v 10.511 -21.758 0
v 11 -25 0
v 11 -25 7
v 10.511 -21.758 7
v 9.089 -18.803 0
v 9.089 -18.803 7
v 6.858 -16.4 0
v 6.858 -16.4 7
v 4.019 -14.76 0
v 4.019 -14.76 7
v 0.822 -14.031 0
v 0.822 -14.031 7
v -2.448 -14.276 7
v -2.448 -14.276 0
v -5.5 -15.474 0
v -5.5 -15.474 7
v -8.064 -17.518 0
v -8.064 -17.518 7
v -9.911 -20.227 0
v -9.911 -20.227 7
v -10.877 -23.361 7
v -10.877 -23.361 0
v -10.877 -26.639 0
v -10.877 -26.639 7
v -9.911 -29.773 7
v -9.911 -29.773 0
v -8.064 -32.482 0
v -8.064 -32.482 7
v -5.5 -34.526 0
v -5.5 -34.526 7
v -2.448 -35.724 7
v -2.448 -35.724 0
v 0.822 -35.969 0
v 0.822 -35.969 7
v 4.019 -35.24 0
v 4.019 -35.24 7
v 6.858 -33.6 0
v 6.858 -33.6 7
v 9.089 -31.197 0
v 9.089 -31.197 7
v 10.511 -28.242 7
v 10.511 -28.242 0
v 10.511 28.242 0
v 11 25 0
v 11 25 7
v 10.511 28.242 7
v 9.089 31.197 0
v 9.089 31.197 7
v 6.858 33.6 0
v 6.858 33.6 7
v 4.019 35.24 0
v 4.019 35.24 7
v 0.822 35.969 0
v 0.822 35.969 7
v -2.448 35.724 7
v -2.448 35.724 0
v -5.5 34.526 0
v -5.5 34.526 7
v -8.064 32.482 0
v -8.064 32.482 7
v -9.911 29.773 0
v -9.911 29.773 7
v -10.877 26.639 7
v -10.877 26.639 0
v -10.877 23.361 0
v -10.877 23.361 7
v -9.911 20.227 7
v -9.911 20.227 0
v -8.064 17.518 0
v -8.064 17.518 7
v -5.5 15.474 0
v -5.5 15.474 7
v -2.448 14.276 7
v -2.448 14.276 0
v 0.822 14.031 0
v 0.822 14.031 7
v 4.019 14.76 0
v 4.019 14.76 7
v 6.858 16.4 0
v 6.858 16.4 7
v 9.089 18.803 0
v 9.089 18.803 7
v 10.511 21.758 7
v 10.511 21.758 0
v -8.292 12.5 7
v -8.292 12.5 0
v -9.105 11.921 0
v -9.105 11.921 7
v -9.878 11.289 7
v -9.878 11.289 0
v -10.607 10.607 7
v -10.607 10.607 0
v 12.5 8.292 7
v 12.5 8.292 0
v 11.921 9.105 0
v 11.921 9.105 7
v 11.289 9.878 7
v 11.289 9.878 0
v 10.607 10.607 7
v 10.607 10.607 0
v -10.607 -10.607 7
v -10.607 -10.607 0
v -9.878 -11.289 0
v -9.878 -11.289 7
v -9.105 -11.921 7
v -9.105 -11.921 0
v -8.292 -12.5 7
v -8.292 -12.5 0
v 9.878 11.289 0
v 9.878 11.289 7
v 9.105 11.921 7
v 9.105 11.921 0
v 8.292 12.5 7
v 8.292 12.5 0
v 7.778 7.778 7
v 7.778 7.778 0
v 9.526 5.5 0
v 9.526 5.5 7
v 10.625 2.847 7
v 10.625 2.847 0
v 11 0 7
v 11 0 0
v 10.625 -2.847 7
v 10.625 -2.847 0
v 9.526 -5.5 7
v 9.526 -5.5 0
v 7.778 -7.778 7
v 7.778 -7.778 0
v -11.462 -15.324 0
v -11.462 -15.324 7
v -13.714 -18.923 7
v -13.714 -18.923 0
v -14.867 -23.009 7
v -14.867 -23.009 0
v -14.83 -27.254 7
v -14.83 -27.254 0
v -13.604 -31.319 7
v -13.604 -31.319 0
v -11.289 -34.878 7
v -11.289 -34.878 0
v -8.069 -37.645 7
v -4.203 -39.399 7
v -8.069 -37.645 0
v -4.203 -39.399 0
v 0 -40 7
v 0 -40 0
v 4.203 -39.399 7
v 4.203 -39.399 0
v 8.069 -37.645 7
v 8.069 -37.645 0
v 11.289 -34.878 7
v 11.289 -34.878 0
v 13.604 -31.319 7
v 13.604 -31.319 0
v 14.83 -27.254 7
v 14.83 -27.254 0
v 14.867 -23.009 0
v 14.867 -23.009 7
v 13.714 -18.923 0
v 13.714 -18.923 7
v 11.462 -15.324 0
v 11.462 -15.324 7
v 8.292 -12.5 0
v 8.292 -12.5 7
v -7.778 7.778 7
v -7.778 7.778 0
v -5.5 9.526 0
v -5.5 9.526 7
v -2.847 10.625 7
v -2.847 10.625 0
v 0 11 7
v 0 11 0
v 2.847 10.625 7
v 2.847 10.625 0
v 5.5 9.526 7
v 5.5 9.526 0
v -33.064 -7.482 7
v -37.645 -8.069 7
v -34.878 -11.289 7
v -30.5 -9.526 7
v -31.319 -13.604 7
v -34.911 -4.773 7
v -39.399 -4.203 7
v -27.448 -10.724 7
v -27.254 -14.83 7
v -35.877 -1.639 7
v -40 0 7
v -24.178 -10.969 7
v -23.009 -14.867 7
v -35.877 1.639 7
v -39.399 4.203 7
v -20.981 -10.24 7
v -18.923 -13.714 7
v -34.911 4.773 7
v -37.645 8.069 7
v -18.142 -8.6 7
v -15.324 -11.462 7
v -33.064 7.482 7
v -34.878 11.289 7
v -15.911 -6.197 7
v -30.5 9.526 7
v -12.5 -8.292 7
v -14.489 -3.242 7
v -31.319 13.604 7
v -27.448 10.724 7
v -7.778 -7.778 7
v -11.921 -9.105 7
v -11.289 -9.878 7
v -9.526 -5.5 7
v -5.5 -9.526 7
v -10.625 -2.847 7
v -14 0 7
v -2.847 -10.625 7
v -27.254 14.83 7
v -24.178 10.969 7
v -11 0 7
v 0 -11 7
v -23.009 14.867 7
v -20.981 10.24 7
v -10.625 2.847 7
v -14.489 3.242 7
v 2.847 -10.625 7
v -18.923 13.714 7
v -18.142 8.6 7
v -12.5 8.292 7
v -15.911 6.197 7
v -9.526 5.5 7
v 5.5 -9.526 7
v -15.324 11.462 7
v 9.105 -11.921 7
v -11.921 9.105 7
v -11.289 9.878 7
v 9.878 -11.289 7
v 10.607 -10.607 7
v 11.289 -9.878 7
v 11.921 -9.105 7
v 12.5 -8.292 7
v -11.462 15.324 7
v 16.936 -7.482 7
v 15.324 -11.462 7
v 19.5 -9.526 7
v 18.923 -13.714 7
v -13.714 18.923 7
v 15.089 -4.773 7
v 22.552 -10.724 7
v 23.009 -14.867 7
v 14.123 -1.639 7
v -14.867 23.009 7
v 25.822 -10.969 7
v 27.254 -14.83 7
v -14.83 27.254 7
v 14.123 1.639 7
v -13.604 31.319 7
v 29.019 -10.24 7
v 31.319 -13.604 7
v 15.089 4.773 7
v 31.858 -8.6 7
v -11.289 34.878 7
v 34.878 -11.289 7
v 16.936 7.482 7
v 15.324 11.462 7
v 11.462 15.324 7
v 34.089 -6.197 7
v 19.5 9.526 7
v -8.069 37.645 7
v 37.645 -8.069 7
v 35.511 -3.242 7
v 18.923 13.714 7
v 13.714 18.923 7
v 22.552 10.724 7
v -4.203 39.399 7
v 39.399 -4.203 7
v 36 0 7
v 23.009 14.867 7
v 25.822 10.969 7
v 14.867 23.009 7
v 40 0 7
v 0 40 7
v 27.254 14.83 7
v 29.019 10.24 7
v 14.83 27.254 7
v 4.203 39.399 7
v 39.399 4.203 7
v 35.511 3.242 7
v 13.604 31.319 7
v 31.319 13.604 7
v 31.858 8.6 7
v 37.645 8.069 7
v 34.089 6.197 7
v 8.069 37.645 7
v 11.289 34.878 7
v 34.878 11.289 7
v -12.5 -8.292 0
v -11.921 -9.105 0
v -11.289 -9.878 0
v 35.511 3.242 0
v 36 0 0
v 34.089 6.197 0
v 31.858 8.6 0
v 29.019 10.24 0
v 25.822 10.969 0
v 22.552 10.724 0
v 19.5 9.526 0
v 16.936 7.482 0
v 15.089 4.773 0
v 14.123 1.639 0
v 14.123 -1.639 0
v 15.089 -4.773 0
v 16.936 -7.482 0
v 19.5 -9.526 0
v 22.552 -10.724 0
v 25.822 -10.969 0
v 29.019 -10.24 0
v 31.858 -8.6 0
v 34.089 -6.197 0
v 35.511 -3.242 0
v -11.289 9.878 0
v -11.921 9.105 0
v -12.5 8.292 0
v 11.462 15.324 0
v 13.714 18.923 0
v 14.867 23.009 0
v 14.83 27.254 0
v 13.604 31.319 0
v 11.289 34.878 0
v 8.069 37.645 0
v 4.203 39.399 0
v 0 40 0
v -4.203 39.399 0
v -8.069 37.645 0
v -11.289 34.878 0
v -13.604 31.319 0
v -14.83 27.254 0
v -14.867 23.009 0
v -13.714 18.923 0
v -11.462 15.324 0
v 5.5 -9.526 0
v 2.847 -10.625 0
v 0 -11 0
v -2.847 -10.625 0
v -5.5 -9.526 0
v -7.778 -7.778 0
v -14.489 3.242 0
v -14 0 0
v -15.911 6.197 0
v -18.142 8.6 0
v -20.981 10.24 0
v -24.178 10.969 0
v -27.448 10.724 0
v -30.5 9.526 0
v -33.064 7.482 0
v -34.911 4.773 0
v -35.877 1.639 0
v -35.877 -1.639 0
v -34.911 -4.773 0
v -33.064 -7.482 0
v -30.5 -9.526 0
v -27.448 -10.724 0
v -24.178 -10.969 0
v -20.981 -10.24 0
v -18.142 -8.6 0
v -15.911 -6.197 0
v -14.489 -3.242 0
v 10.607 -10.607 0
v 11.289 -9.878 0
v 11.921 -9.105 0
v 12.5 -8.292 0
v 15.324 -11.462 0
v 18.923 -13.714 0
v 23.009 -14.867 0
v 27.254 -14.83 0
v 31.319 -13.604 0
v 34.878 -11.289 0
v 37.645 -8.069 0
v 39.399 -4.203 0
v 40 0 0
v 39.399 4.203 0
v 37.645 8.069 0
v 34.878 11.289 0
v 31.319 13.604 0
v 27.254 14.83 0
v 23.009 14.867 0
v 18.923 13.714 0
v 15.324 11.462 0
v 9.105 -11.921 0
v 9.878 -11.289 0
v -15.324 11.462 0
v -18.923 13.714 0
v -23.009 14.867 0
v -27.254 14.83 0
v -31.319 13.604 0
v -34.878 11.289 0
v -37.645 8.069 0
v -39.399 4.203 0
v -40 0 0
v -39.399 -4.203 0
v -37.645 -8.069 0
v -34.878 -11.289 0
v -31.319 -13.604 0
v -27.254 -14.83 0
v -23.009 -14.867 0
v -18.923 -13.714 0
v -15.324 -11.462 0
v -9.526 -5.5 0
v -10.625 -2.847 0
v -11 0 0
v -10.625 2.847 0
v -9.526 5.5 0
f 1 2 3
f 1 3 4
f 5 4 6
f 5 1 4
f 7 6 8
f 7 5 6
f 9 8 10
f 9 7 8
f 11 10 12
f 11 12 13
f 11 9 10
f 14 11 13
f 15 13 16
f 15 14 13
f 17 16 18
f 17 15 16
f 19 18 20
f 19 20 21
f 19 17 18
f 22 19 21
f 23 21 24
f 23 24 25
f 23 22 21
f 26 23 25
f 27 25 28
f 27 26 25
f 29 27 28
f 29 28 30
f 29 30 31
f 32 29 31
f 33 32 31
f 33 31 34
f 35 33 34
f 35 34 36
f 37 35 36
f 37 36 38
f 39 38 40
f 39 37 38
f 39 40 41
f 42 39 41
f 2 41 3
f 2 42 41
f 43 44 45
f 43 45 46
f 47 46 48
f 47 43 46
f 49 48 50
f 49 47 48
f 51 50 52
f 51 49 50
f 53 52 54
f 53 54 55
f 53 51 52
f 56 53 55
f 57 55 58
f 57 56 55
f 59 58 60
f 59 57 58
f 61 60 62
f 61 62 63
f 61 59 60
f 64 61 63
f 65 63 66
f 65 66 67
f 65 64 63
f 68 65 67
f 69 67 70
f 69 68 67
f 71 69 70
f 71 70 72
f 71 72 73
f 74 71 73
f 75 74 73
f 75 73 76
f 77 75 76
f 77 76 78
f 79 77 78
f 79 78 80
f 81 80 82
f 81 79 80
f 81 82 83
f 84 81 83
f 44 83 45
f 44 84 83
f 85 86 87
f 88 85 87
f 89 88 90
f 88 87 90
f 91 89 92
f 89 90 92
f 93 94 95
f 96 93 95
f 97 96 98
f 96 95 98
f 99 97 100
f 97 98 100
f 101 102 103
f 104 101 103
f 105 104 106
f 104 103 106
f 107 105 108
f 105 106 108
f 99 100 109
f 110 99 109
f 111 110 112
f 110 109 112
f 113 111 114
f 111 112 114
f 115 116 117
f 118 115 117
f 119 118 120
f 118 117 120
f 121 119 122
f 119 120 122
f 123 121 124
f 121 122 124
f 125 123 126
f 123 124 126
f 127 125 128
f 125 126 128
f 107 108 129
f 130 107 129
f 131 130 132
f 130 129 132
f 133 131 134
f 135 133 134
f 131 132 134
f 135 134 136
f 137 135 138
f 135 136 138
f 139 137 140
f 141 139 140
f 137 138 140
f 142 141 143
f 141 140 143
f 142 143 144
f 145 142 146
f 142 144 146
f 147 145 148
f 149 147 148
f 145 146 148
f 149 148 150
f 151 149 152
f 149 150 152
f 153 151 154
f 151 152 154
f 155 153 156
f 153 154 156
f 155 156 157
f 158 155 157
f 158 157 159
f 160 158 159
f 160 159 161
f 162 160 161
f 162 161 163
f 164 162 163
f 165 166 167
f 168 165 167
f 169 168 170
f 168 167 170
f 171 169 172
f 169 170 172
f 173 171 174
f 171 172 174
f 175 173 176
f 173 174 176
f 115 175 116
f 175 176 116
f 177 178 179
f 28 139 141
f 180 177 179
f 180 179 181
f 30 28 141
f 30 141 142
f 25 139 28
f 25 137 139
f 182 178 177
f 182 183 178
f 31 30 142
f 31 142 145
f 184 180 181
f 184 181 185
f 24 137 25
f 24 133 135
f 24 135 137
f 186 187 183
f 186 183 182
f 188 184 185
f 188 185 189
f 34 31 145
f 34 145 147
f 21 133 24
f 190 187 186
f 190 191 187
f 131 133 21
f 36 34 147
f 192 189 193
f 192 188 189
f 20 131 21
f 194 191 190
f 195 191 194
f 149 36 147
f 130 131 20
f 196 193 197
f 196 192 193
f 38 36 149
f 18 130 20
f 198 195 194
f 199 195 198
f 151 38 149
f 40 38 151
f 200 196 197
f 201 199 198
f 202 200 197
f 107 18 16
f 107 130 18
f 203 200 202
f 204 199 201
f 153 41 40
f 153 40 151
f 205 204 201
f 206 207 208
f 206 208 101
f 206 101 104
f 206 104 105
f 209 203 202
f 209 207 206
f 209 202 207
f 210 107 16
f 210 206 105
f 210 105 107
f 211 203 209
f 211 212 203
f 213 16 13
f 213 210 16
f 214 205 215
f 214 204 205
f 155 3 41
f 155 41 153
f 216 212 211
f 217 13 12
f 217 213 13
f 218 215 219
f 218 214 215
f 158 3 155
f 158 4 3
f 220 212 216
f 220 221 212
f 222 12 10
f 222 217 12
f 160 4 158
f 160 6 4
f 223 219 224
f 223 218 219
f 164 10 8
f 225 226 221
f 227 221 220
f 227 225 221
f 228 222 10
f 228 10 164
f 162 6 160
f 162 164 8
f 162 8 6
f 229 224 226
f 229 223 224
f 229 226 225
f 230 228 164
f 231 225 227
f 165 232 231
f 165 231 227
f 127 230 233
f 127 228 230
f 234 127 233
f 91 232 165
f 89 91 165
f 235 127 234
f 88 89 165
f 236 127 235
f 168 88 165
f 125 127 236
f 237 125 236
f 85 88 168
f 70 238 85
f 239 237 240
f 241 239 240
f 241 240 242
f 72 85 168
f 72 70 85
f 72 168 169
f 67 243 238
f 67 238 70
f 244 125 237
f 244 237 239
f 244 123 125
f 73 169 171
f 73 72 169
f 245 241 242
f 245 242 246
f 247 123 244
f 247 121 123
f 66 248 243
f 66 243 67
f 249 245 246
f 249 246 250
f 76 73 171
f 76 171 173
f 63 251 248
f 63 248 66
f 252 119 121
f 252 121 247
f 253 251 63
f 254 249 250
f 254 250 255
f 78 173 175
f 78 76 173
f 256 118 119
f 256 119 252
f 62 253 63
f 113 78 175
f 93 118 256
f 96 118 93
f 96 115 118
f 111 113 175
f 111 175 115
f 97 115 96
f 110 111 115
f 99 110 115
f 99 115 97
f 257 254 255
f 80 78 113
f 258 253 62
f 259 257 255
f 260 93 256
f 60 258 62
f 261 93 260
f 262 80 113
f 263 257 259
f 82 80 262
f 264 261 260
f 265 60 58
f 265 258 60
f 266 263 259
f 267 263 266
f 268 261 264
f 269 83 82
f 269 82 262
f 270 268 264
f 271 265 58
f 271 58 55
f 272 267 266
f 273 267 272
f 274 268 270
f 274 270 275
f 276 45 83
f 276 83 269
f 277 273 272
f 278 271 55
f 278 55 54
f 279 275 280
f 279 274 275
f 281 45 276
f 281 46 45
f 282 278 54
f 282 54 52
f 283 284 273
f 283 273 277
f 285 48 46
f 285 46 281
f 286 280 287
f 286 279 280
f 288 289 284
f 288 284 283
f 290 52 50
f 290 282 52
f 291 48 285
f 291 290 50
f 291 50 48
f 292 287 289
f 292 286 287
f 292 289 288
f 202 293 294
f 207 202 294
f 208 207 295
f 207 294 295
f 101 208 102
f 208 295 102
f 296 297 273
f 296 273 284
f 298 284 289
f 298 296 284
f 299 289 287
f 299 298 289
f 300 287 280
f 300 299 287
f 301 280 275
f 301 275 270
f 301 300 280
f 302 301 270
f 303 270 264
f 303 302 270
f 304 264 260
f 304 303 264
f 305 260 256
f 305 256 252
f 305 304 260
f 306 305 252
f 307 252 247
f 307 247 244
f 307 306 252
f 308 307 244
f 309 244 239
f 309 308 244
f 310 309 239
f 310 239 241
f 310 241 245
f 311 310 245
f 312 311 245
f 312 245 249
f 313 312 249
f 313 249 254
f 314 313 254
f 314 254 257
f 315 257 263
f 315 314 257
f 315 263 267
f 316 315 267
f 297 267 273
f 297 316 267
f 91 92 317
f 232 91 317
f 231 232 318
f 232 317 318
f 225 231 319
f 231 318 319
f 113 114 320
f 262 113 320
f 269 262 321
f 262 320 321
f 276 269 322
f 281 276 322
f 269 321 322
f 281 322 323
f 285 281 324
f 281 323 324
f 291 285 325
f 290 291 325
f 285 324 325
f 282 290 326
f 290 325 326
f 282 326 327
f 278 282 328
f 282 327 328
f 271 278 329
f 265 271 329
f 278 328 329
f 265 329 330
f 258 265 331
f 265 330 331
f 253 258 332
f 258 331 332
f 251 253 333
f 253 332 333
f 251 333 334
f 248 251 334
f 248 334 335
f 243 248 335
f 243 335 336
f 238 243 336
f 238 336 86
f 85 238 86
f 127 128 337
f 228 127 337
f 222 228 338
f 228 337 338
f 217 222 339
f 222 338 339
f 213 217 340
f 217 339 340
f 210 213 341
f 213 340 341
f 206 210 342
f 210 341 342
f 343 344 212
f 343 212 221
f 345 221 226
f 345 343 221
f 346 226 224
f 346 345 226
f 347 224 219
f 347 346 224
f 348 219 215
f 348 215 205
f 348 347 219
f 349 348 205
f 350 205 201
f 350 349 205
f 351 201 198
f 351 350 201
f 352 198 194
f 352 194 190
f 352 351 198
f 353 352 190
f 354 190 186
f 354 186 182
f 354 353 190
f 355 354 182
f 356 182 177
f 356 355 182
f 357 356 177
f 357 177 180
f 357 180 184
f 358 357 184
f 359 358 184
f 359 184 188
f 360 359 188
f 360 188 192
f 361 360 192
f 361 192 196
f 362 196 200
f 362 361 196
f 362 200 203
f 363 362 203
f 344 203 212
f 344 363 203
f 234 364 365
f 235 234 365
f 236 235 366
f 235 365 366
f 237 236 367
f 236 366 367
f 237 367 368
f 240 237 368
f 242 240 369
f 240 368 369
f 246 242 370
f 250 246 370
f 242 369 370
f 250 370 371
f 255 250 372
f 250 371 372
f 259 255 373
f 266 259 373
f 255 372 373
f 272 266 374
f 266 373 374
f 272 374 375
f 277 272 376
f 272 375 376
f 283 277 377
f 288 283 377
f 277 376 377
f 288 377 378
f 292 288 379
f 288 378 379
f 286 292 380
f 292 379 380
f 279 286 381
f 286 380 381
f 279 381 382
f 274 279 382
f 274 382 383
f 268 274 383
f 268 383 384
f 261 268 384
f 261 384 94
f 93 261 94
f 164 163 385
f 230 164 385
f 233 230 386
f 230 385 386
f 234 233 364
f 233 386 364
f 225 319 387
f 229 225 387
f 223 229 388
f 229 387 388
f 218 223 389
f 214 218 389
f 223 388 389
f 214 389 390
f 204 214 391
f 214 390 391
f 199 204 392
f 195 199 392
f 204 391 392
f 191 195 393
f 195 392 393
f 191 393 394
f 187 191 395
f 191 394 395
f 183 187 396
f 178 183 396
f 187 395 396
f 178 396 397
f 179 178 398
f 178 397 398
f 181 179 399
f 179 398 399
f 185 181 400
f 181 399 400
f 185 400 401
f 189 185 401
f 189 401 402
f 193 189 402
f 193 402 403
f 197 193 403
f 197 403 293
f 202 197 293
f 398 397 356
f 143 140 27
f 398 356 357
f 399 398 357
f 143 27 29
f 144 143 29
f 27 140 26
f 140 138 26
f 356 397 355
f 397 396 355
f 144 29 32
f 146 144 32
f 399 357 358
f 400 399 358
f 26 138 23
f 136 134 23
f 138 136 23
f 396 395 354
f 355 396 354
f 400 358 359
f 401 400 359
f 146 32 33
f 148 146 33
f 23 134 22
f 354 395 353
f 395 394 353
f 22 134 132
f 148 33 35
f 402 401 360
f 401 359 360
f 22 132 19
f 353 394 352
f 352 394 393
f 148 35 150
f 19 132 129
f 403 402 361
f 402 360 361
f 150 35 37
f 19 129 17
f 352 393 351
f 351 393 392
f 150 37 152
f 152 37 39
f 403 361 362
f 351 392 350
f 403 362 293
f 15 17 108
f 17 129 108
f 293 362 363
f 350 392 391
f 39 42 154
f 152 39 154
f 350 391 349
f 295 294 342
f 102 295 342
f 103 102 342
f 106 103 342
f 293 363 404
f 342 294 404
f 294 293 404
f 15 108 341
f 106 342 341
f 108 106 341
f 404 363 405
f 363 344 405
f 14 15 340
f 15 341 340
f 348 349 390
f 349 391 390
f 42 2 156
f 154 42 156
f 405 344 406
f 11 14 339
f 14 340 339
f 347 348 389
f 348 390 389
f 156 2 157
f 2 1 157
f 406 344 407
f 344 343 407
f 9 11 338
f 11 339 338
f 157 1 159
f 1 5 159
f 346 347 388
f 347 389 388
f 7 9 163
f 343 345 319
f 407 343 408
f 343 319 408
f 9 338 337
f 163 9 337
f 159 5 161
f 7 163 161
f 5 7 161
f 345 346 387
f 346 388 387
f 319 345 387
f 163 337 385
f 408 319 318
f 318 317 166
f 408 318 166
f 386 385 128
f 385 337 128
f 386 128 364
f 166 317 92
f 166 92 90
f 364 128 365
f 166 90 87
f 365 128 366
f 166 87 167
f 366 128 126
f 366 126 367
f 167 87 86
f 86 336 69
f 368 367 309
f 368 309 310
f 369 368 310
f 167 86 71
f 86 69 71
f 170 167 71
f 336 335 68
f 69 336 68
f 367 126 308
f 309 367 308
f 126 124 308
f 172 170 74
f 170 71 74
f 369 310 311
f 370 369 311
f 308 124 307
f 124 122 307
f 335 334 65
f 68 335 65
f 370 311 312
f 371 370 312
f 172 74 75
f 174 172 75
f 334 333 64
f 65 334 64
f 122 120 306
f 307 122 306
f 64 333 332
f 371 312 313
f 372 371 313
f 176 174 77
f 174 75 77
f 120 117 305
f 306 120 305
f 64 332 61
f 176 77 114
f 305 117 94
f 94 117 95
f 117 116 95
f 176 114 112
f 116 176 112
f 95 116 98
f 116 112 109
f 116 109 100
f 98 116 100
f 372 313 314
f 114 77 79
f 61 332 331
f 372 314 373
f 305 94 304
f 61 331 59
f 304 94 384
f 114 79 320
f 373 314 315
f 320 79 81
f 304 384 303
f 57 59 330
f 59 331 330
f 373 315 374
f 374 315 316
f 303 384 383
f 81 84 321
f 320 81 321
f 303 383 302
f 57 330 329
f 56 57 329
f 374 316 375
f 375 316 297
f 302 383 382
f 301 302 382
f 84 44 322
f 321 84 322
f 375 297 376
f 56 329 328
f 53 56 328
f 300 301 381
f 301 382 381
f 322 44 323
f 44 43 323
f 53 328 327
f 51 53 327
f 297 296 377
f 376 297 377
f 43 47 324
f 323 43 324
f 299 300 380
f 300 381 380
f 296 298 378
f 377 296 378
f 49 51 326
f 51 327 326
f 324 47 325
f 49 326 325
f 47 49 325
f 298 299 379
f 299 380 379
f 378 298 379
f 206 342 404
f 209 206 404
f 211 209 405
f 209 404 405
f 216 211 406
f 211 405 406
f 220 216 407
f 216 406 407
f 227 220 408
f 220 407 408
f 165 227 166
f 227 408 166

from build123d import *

# Parameters (mm, degrees)
F0_R     = 11
F1_DEPTH = 7


with BuildPart() as f1:
    # F0 (on Top) → F1 (new body)
    with BuildSketch(Plane.XY):
        with BuildLine():
            ThreePointArc((10.606602, 10.606602), (9.496388, 11.611142), (8.291562, 12.5))
            ThreePointArc((8.291562, 12.5), (0, 40), (-8.291562, 12.5))
            ThreePointArc((-8.291562, 12.5), (-9.496388, 11.611142), (-10.606602, 10.606602))
            ThreePointArc((-10.606602, 10.606602), (-11.611142, 9.496388), (-12.5, 8.291562))
            ThreePointArc((-12.5, 8.291562), (-40, 0), (-12.5, -8.291562))
            ThreePointArc((-12.5, -8.291562), (-11.611142, -9.496388), (-10.606602, -10.606602))
            ThreePointArc((-10.606602, -10.606602), (-9.496388, -11.611142), (-8.291562, -12.5))
            ThreePointArc((-8.291562, -12.5), (0, -40), (8.291562, -12.5))
            ThreePointArc((8.291562, -12.5), (9.496388, -11.611142), (10.606602, -10.606602))
            ThreePointArc((10.606602, -10.606602), (11.611142, -9.496388), (12.5, -8.291562))
            ThreePointArc((12.5, -8.291562), (40, 0), (12.5, 8.291562))
            ThreePointArc((12.5, 8.291562), (11.611142, 9.496388), (10.606602, 10.606602))
        make_face()
        with Locations((0, -25)):
            Circle(F0_R, mode=Mode.SUBTRACT)
        with Locations((-25, 0)):
            Circle(F0_R, mode=Mode.SUBTRACT)
        with BuildLine():
            ThreePointArc((-7.778175, 7.778175), (0, 11), (7.778175, 7.778175))
            ThreePointArc((7.778175, 7.778175), (11, 0), (7.778175, -7.778175))
            ThreePointArc((7.778175, -7.778175), (0, -11), (-7.778175, -7.778175))
            ThreePointArc((-7.778175, -7.778175), (-11, 0), (-7.778175, 7.778175))
        make_face(mode=Mode.SUBTRACT)
        with Locations((25, 0)):
            Circle(F0_R, mode=Mode.SUBTRACT)
        with Locations((0, 25)):
            Circle(F0_R, mode=Mode.SUBTRACT)
    extrude(amount=F1_DEPTH)


solid = f1.part
